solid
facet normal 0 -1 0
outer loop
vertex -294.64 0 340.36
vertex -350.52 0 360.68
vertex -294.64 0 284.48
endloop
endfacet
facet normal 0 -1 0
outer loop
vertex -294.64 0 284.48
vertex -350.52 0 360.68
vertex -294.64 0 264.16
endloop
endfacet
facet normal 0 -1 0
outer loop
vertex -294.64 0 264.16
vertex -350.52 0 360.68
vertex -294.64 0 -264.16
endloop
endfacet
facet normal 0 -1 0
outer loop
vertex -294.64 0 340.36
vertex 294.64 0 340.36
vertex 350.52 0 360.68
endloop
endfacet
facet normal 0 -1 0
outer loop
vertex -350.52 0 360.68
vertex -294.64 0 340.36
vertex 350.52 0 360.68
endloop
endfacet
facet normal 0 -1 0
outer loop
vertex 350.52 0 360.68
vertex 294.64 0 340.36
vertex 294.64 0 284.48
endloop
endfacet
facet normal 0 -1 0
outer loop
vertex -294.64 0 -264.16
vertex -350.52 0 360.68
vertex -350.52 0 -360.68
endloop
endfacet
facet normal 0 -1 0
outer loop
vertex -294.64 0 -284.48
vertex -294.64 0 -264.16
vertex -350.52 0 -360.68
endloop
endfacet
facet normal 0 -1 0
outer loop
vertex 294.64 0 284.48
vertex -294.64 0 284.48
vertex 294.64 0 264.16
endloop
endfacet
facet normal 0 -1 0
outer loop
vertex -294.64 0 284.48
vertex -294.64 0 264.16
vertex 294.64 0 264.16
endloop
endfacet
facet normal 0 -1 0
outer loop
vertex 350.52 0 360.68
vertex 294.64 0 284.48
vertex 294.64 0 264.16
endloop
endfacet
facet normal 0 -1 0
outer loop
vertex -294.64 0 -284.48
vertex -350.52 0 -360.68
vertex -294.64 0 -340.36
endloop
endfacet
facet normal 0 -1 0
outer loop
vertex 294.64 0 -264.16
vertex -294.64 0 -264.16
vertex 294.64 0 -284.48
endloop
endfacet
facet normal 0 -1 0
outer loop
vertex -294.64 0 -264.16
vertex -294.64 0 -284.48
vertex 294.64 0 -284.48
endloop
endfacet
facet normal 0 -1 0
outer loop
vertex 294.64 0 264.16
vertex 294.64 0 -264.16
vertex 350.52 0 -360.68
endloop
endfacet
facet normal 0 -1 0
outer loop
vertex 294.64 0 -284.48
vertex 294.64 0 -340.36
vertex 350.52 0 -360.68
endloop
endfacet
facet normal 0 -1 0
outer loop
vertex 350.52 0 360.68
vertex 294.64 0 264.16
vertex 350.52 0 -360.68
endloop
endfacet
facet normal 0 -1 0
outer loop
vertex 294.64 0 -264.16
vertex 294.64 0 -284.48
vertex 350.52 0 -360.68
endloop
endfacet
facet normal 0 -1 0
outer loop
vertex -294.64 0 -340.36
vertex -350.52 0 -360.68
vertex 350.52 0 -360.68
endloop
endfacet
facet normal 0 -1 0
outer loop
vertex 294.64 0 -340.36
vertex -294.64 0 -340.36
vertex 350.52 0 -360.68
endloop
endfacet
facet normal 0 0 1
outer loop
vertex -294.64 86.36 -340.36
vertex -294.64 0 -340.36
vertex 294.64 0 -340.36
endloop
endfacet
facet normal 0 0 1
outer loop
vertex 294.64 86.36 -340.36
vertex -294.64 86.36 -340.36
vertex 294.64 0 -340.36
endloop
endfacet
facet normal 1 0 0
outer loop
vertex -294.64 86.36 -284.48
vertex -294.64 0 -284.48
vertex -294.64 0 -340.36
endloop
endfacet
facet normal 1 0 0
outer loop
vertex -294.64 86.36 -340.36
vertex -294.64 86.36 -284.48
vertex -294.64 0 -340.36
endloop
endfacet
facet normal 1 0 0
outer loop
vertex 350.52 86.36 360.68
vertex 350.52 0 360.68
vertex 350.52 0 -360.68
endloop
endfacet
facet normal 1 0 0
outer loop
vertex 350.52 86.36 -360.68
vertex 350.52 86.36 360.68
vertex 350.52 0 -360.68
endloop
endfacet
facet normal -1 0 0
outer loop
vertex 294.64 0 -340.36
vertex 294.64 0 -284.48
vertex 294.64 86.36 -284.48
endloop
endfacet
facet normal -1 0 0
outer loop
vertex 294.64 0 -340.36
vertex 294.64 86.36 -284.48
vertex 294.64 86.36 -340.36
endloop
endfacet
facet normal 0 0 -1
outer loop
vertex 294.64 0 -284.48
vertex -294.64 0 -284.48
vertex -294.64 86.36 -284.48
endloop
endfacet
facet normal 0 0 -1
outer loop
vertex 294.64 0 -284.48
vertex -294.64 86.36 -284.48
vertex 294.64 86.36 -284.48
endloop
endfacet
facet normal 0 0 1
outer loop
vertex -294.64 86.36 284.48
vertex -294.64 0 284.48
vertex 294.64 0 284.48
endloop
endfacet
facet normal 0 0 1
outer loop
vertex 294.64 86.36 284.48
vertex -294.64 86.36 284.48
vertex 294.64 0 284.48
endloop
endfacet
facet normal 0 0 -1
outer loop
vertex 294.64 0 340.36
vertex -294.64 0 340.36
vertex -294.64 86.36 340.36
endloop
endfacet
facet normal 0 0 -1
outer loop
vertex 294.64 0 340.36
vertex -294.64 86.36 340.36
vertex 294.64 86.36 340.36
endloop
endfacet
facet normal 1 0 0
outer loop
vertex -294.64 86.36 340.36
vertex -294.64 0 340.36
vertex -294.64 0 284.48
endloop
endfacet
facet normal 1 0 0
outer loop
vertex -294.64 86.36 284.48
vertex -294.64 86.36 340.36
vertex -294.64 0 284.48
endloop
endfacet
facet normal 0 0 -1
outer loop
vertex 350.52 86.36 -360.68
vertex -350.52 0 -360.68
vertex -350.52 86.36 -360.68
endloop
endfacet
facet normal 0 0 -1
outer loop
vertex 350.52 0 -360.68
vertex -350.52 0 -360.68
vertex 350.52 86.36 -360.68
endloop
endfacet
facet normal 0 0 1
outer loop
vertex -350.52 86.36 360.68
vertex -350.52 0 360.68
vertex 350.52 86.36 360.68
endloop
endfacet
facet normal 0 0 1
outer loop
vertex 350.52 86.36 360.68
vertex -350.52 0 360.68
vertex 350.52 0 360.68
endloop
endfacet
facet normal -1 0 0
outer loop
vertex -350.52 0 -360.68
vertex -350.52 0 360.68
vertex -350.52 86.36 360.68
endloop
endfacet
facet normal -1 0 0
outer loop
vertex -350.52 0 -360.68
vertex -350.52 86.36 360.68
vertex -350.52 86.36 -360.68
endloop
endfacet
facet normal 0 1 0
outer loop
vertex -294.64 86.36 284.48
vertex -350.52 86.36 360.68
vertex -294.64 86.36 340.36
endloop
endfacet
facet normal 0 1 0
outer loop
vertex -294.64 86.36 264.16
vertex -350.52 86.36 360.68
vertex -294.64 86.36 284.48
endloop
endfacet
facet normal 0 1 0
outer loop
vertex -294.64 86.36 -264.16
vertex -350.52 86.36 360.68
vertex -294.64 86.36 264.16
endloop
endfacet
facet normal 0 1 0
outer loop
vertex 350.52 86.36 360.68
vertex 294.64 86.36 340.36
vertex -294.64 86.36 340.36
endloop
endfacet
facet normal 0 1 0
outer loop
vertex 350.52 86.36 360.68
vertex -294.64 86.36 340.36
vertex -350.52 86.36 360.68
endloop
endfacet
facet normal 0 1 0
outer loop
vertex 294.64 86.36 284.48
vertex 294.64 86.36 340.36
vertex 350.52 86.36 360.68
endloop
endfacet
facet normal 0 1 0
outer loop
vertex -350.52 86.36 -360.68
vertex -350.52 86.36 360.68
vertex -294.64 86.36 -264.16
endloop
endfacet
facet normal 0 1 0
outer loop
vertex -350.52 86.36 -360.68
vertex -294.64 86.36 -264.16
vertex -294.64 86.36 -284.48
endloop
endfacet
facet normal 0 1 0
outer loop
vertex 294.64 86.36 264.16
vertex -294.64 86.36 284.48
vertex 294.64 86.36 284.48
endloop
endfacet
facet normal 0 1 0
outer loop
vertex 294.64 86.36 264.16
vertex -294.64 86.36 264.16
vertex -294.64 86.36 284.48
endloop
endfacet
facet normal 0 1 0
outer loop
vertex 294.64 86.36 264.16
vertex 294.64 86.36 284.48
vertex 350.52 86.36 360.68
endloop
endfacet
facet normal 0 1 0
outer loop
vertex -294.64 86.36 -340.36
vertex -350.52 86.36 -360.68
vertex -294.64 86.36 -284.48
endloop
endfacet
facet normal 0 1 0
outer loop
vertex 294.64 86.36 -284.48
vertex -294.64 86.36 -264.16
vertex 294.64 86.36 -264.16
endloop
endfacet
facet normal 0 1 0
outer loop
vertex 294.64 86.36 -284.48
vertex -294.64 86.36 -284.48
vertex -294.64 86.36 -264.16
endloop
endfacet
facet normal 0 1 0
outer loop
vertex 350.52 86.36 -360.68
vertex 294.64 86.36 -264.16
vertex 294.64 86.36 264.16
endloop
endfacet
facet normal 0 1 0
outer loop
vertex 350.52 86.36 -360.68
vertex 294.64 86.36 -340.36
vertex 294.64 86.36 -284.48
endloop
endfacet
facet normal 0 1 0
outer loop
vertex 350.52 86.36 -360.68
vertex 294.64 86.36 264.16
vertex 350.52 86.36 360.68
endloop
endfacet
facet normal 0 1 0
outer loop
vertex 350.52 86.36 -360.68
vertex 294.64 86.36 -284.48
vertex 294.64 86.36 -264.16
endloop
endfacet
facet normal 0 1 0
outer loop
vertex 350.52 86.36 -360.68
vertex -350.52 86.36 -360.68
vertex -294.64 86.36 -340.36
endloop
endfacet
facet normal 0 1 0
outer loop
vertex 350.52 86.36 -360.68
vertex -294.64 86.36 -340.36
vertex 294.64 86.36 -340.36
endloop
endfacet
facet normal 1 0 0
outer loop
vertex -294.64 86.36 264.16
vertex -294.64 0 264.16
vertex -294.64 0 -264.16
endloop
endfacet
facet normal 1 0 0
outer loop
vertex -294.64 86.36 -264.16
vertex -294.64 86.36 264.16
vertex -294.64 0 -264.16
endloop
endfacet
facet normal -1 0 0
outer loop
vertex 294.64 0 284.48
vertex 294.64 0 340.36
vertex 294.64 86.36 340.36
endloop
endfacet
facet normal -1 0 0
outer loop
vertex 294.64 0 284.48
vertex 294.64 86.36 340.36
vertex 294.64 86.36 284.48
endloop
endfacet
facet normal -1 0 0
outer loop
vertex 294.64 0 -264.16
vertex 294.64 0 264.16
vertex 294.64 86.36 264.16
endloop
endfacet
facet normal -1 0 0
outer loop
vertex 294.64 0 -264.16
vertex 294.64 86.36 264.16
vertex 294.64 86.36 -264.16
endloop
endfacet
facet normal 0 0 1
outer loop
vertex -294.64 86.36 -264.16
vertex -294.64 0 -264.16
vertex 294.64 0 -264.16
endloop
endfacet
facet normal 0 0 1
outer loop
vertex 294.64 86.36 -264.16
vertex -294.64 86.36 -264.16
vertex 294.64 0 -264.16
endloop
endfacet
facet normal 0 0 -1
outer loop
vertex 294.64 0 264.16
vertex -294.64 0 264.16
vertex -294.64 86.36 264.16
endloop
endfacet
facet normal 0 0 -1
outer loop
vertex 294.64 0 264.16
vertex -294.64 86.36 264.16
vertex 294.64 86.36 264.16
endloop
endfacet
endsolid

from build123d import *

# Parameters (mm, degrees)
SKETCH1_W           = 701.04
SKETCH1_H           = 721.36
SKETCH1_W_2         = 589.28
SKETCH1_H_2         = 55.88
SKETCH1_H_3         = 528.32
BOSS_EXTRUDE1_DEPTH = 86.36


with BuildPart() as part:
    # Sketch1 → Boss-Extrude1 (new body)
    with BuildSketch(Plane(origin=(0, 0, 0), x_dir=(1, 0, 0), z_dir=(0, 1, 0))):
        Rectangle(SKETCH1_W, SKETCH1_H)
        with Locations((0, 312.42)):
            Rectangle(SKETCH1_W_2, SKETCH1_H_2, mode=Mode.SUBTRACT)
        Rectangle(SKETCH1_W_2, SKETCH1_H_3, mode=Mode.SUBTRACT)
        with Locations((0, -312.42)):
            Rectangle(SKETCH1_W_2, SKETCH1_H_2, mode=Mode.SUBTRACT)
    extrude(amount=BOSS_EXTRUDE1_DEPTH)


solid = part.part
